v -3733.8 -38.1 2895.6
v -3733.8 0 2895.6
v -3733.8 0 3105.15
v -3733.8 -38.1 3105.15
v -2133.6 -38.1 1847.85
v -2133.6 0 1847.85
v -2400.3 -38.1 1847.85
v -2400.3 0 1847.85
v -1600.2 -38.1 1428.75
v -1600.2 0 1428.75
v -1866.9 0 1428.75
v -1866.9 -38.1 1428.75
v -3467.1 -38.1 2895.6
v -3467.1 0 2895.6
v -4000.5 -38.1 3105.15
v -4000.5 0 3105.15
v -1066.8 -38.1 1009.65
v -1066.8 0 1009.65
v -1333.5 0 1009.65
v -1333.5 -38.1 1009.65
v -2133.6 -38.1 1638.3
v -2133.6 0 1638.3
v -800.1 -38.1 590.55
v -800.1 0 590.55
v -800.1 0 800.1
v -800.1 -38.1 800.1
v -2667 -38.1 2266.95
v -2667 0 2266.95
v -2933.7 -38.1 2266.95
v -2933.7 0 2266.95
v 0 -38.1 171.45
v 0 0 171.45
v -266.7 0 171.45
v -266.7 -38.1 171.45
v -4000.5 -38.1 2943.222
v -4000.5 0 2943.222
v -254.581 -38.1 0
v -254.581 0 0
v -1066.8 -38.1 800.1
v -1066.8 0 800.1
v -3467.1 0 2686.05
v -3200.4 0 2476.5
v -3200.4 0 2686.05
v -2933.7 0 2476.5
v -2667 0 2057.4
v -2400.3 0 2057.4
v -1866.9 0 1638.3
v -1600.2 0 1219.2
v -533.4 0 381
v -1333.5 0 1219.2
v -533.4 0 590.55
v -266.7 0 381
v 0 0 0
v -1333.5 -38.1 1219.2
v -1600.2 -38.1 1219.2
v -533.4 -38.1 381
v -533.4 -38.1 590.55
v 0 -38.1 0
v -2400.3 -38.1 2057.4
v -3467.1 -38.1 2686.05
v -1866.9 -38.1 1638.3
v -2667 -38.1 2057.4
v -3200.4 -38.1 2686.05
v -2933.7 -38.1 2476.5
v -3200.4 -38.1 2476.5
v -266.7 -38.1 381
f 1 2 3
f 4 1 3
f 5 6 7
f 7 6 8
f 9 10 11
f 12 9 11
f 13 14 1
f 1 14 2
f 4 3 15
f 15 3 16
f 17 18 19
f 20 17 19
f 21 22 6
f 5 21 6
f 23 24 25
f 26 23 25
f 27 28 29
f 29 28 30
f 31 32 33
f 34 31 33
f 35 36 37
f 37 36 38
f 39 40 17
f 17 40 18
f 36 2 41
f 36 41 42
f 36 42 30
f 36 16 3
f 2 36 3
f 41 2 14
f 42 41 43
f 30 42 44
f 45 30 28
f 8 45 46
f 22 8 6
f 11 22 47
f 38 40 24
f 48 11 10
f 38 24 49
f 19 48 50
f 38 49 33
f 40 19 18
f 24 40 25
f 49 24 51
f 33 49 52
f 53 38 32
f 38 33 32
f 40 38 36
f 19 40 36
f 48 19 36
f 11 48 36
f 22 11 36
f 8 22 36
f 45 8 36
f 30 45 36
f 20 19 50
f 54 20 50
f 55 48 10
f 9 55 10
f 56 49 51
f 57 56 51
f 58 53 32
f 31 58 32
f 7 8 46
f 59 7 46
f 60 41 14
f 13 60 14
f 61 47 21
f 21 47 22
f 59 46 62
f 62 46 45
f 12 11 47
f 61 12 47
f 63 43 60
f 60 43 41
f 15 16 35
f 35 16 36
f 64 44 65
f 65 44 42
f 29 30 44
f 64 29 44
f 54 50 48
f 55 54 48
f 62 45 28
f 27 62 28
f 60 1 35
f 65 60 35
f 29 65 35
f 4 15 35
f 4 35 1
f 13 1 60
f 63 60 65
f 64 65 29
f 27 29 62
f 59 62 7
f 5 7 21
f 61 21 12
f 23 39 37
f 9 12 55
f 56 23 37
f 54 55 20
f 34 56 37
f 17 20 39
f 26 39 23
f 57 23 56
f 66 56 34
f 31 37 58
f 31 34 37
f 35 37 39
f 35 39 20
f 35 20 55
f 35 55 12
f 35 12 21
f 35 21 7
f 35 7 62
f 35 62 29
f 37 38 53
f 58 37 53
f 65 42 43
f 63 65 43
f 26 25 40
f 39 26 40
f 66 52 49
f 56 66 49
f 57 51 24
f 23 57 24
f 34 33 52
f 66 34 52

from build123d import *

# Parameters (mm, degrees)
F1_DEPTH = 38.1


with BuildPart() as f1:
    # F0 (on Front) → F1 (new body)
    with BuildSketch(Plane.XZ):
        Polygon((-254.581149, 0), (0, 0), (0, 171.45), (-266.7, 171.45), (-266.7, 381), (-533.4, 381), (-533.4, 590.55), (-800.1, 590.55), (-800.1, 800.1), (-1066.8, 800.1), (-1066.8, 1009.65), (-1333.5, 1009.65), (-1333.5, 1219.2), (-1600.2, 1219.2), (-1600.2, 1428.75), (-1866.9, 1428.75), (-1866.9, 1638.3), (-2133.6, 1638.3), (-2133.6, 1847.85), (-2400.3, 1847.85), (-2400.3, 2057.4), (-2667, 2057.4), (-2667, 2266.95), (-2933.7, 2266.95), (-2933.7, 2476.5), (-3200.4, 2476.5), (-3200.4, 2686.05), (-3467.1, 2686.05), (-3467.1, 2895.6), (-3733.8, 2895.6), (-3733.8, 3105.15), (-4000.5, 3105.15), (-4000.5, 2943.221954), align=None)
    extrude(amount=F1_DEPTH)


solid = f1.part
